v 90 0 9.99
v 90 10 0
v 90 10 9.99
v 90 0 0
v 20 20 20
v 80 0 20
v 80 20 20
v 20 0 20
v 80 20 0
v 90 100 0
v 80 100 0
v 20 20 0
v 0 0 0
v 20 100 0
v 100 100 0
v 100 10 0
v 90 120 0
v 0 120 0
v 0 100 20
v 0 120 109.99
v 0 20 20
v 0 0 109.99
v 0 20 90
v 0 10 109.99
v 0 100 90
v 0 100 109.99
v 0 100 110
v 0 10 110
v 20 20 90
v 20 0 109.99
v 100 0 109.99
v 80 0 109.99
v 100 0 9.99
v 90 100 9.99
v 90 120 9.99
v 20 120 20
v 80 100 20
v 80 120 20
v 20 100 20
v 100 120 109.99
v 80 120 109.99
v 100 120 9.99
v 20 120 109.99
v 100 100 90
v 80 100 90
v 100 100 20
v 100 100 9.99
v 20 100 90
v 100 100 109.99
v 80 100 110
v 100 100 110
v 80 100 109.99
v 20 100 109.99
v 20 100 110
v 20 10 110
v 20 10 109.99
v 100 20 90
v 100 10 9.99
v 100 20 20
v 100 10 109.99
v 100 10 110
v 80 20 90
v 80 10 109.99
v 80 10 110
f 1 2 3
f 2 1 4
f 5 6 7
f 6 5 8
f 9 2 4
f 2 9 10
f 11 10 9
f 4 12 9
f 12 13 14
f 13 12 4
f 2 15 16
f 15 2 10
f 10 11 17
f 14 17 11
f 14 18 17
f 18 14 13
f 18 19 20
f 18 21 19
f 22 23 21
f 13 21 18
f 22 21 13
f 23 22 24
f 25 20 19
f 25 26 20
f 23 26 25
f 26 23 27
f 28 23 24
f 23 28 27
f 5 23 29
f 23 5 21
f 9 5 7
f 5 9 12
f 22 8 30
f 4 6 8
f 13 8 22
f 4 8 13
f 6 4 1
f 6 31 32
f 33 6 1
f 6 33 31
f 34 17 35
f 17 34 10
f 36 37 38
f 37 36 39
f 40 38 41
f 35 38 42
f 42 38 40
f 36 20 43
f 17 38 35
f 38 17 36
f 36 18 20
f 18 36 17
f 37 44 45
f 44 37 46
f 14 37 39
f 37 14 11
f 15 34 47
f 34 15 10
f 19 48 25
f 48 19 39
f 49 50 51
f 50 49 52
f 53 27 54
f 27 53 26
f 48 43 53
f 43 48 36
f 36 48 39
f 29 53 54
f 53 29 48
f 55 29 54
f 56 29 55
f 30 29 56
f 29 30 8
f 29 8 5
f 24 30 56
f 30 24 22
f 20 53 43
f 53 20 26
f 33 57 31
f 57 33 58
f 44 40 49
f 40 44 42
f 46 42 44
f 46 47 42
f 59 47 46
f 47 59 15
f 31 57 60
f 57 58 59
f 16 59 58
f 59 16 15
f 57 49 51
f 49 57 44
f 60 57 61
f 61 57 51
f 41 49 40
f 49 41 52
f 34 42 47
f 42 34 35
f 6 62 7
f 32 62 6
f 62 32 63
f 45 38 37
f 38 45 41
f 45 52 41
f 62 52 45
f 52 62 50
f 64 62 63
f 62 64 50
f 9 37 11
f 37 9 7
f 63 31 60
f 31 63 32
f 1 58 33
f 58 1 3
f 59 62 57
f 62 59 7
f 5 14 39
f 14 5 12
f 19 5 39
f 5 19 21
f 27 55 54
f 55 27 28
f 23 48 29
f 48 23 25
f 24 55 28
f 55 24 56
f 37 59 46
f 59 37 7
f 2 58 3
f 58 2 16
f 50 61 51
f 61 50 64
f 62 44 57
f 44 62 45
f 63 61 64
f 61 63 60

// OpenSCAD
cube([90,20,20]);

translate([0,100, 0])
cube([90,20,20]);

translate([0, 0, 10-.01])
cube([20,20,100]);

translate([0, 100, 10-.01])
cube([20,20,100]);

translate([90-10, 100, 10-.01])
cube([20,20,100]);

translate([90-10, 0, 10-.01])
cube([20,20,100]);

cube([20, 100, 20]);


translate([0, 10, 100-10])
cube([20, 90, 20]);

translate([90-10, 10, 0])
cube([20, 90, 20]);

translate([90-10, 10, 100-10])
cube([20, 90, 20]);
